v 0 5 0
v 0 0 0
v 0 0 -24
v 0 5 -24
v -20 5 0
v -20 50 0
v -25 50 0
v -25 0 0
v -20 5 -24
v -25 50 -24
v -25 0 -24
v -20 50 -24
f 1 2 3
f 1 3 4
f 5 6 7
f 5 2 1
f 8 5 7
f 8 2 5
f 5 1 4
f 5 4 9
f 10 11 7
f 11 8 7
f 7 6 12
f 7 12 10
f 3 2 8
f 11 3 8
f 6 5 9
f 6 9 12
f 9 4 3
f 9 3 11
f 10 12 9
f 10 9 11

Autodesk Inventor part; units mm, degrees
ref_plane "YZ Plane" through (0, 0, 0) normal (1, 0, 0) x (0, 1, 0)
ref_plane "XZ Plane" through (0, 0, 0) normal (0, 1, 0) x (-1, 0, 0)
ref_plane "XY Plane" through (0, 0, 0) normal (0, 0, 1) x (1, 0, 0)
sketch "Sketch1" plane through (0, 0, 0) normal (0, 1, 0) x (-1, 0, 0)
  line L0 (0, 0) -> (25, 0)
  line L1 (25, 0) -> (25, -10)
  line L2 (25, -10) -> (0, -10)
  line L3 (0, -10) -> (0, 0)
  dimension "d0" = 25
  dimension "d1" = 10
extrude "Extrusion1" add sketch "Sketch1" along normal blind 5
sketch "Sketch2" plane through (0, 5, 0) normal (0, 1, 0) x (1, 0, 0)
  line L0 (-25, 10) -> (-25, 0) projected
  line L1 (-25, 0) -> (0, 0) projected
  line L2 (-25, 10) -> (-20, 10)
  line L3 (-20, 10) -> (-20, 0)
  line L4 (-20, 0) -> (-25, 0)
  line L5 (-25, 0) -> (-25, 10)
  dimension "d4" = 5
extrude "Extrusion2" add sketch "Sketch2" along normal blind 45
sketch "Sketch3" plane through (0, 0, -10) normal (0, 0, -1) x (-1, 0, 0)
  point P0 (0, 0)
sketch "Sketch4" plane through (0, 0, -10) normal (0, 0, -1) x (-1, 0, 0)
  line L0 (0, 5) -> (20, 5) projected
  line L1 (0, 0) -> (0, 5) projected
  line L2 (0, 5) -> (0, 0)
  line L3 (0, 0) -> (25, 0)
  line L4 (25, 0) -> (25, 50) projected
  line L5 (25, 0) -> (25, 50)
  line L6 (20, 50) -> (25, 50) projected
  line L7 (25, 50) -> (20, 50)
  line L8 (20, 5) -> (20, 50) projected
  line L9 (20, 50) -> (20, 5)
  line L10 (20, 5) -> (0, 5)
extrude "Extrusion3" add sketch "Sketch4" along normal blind 14
